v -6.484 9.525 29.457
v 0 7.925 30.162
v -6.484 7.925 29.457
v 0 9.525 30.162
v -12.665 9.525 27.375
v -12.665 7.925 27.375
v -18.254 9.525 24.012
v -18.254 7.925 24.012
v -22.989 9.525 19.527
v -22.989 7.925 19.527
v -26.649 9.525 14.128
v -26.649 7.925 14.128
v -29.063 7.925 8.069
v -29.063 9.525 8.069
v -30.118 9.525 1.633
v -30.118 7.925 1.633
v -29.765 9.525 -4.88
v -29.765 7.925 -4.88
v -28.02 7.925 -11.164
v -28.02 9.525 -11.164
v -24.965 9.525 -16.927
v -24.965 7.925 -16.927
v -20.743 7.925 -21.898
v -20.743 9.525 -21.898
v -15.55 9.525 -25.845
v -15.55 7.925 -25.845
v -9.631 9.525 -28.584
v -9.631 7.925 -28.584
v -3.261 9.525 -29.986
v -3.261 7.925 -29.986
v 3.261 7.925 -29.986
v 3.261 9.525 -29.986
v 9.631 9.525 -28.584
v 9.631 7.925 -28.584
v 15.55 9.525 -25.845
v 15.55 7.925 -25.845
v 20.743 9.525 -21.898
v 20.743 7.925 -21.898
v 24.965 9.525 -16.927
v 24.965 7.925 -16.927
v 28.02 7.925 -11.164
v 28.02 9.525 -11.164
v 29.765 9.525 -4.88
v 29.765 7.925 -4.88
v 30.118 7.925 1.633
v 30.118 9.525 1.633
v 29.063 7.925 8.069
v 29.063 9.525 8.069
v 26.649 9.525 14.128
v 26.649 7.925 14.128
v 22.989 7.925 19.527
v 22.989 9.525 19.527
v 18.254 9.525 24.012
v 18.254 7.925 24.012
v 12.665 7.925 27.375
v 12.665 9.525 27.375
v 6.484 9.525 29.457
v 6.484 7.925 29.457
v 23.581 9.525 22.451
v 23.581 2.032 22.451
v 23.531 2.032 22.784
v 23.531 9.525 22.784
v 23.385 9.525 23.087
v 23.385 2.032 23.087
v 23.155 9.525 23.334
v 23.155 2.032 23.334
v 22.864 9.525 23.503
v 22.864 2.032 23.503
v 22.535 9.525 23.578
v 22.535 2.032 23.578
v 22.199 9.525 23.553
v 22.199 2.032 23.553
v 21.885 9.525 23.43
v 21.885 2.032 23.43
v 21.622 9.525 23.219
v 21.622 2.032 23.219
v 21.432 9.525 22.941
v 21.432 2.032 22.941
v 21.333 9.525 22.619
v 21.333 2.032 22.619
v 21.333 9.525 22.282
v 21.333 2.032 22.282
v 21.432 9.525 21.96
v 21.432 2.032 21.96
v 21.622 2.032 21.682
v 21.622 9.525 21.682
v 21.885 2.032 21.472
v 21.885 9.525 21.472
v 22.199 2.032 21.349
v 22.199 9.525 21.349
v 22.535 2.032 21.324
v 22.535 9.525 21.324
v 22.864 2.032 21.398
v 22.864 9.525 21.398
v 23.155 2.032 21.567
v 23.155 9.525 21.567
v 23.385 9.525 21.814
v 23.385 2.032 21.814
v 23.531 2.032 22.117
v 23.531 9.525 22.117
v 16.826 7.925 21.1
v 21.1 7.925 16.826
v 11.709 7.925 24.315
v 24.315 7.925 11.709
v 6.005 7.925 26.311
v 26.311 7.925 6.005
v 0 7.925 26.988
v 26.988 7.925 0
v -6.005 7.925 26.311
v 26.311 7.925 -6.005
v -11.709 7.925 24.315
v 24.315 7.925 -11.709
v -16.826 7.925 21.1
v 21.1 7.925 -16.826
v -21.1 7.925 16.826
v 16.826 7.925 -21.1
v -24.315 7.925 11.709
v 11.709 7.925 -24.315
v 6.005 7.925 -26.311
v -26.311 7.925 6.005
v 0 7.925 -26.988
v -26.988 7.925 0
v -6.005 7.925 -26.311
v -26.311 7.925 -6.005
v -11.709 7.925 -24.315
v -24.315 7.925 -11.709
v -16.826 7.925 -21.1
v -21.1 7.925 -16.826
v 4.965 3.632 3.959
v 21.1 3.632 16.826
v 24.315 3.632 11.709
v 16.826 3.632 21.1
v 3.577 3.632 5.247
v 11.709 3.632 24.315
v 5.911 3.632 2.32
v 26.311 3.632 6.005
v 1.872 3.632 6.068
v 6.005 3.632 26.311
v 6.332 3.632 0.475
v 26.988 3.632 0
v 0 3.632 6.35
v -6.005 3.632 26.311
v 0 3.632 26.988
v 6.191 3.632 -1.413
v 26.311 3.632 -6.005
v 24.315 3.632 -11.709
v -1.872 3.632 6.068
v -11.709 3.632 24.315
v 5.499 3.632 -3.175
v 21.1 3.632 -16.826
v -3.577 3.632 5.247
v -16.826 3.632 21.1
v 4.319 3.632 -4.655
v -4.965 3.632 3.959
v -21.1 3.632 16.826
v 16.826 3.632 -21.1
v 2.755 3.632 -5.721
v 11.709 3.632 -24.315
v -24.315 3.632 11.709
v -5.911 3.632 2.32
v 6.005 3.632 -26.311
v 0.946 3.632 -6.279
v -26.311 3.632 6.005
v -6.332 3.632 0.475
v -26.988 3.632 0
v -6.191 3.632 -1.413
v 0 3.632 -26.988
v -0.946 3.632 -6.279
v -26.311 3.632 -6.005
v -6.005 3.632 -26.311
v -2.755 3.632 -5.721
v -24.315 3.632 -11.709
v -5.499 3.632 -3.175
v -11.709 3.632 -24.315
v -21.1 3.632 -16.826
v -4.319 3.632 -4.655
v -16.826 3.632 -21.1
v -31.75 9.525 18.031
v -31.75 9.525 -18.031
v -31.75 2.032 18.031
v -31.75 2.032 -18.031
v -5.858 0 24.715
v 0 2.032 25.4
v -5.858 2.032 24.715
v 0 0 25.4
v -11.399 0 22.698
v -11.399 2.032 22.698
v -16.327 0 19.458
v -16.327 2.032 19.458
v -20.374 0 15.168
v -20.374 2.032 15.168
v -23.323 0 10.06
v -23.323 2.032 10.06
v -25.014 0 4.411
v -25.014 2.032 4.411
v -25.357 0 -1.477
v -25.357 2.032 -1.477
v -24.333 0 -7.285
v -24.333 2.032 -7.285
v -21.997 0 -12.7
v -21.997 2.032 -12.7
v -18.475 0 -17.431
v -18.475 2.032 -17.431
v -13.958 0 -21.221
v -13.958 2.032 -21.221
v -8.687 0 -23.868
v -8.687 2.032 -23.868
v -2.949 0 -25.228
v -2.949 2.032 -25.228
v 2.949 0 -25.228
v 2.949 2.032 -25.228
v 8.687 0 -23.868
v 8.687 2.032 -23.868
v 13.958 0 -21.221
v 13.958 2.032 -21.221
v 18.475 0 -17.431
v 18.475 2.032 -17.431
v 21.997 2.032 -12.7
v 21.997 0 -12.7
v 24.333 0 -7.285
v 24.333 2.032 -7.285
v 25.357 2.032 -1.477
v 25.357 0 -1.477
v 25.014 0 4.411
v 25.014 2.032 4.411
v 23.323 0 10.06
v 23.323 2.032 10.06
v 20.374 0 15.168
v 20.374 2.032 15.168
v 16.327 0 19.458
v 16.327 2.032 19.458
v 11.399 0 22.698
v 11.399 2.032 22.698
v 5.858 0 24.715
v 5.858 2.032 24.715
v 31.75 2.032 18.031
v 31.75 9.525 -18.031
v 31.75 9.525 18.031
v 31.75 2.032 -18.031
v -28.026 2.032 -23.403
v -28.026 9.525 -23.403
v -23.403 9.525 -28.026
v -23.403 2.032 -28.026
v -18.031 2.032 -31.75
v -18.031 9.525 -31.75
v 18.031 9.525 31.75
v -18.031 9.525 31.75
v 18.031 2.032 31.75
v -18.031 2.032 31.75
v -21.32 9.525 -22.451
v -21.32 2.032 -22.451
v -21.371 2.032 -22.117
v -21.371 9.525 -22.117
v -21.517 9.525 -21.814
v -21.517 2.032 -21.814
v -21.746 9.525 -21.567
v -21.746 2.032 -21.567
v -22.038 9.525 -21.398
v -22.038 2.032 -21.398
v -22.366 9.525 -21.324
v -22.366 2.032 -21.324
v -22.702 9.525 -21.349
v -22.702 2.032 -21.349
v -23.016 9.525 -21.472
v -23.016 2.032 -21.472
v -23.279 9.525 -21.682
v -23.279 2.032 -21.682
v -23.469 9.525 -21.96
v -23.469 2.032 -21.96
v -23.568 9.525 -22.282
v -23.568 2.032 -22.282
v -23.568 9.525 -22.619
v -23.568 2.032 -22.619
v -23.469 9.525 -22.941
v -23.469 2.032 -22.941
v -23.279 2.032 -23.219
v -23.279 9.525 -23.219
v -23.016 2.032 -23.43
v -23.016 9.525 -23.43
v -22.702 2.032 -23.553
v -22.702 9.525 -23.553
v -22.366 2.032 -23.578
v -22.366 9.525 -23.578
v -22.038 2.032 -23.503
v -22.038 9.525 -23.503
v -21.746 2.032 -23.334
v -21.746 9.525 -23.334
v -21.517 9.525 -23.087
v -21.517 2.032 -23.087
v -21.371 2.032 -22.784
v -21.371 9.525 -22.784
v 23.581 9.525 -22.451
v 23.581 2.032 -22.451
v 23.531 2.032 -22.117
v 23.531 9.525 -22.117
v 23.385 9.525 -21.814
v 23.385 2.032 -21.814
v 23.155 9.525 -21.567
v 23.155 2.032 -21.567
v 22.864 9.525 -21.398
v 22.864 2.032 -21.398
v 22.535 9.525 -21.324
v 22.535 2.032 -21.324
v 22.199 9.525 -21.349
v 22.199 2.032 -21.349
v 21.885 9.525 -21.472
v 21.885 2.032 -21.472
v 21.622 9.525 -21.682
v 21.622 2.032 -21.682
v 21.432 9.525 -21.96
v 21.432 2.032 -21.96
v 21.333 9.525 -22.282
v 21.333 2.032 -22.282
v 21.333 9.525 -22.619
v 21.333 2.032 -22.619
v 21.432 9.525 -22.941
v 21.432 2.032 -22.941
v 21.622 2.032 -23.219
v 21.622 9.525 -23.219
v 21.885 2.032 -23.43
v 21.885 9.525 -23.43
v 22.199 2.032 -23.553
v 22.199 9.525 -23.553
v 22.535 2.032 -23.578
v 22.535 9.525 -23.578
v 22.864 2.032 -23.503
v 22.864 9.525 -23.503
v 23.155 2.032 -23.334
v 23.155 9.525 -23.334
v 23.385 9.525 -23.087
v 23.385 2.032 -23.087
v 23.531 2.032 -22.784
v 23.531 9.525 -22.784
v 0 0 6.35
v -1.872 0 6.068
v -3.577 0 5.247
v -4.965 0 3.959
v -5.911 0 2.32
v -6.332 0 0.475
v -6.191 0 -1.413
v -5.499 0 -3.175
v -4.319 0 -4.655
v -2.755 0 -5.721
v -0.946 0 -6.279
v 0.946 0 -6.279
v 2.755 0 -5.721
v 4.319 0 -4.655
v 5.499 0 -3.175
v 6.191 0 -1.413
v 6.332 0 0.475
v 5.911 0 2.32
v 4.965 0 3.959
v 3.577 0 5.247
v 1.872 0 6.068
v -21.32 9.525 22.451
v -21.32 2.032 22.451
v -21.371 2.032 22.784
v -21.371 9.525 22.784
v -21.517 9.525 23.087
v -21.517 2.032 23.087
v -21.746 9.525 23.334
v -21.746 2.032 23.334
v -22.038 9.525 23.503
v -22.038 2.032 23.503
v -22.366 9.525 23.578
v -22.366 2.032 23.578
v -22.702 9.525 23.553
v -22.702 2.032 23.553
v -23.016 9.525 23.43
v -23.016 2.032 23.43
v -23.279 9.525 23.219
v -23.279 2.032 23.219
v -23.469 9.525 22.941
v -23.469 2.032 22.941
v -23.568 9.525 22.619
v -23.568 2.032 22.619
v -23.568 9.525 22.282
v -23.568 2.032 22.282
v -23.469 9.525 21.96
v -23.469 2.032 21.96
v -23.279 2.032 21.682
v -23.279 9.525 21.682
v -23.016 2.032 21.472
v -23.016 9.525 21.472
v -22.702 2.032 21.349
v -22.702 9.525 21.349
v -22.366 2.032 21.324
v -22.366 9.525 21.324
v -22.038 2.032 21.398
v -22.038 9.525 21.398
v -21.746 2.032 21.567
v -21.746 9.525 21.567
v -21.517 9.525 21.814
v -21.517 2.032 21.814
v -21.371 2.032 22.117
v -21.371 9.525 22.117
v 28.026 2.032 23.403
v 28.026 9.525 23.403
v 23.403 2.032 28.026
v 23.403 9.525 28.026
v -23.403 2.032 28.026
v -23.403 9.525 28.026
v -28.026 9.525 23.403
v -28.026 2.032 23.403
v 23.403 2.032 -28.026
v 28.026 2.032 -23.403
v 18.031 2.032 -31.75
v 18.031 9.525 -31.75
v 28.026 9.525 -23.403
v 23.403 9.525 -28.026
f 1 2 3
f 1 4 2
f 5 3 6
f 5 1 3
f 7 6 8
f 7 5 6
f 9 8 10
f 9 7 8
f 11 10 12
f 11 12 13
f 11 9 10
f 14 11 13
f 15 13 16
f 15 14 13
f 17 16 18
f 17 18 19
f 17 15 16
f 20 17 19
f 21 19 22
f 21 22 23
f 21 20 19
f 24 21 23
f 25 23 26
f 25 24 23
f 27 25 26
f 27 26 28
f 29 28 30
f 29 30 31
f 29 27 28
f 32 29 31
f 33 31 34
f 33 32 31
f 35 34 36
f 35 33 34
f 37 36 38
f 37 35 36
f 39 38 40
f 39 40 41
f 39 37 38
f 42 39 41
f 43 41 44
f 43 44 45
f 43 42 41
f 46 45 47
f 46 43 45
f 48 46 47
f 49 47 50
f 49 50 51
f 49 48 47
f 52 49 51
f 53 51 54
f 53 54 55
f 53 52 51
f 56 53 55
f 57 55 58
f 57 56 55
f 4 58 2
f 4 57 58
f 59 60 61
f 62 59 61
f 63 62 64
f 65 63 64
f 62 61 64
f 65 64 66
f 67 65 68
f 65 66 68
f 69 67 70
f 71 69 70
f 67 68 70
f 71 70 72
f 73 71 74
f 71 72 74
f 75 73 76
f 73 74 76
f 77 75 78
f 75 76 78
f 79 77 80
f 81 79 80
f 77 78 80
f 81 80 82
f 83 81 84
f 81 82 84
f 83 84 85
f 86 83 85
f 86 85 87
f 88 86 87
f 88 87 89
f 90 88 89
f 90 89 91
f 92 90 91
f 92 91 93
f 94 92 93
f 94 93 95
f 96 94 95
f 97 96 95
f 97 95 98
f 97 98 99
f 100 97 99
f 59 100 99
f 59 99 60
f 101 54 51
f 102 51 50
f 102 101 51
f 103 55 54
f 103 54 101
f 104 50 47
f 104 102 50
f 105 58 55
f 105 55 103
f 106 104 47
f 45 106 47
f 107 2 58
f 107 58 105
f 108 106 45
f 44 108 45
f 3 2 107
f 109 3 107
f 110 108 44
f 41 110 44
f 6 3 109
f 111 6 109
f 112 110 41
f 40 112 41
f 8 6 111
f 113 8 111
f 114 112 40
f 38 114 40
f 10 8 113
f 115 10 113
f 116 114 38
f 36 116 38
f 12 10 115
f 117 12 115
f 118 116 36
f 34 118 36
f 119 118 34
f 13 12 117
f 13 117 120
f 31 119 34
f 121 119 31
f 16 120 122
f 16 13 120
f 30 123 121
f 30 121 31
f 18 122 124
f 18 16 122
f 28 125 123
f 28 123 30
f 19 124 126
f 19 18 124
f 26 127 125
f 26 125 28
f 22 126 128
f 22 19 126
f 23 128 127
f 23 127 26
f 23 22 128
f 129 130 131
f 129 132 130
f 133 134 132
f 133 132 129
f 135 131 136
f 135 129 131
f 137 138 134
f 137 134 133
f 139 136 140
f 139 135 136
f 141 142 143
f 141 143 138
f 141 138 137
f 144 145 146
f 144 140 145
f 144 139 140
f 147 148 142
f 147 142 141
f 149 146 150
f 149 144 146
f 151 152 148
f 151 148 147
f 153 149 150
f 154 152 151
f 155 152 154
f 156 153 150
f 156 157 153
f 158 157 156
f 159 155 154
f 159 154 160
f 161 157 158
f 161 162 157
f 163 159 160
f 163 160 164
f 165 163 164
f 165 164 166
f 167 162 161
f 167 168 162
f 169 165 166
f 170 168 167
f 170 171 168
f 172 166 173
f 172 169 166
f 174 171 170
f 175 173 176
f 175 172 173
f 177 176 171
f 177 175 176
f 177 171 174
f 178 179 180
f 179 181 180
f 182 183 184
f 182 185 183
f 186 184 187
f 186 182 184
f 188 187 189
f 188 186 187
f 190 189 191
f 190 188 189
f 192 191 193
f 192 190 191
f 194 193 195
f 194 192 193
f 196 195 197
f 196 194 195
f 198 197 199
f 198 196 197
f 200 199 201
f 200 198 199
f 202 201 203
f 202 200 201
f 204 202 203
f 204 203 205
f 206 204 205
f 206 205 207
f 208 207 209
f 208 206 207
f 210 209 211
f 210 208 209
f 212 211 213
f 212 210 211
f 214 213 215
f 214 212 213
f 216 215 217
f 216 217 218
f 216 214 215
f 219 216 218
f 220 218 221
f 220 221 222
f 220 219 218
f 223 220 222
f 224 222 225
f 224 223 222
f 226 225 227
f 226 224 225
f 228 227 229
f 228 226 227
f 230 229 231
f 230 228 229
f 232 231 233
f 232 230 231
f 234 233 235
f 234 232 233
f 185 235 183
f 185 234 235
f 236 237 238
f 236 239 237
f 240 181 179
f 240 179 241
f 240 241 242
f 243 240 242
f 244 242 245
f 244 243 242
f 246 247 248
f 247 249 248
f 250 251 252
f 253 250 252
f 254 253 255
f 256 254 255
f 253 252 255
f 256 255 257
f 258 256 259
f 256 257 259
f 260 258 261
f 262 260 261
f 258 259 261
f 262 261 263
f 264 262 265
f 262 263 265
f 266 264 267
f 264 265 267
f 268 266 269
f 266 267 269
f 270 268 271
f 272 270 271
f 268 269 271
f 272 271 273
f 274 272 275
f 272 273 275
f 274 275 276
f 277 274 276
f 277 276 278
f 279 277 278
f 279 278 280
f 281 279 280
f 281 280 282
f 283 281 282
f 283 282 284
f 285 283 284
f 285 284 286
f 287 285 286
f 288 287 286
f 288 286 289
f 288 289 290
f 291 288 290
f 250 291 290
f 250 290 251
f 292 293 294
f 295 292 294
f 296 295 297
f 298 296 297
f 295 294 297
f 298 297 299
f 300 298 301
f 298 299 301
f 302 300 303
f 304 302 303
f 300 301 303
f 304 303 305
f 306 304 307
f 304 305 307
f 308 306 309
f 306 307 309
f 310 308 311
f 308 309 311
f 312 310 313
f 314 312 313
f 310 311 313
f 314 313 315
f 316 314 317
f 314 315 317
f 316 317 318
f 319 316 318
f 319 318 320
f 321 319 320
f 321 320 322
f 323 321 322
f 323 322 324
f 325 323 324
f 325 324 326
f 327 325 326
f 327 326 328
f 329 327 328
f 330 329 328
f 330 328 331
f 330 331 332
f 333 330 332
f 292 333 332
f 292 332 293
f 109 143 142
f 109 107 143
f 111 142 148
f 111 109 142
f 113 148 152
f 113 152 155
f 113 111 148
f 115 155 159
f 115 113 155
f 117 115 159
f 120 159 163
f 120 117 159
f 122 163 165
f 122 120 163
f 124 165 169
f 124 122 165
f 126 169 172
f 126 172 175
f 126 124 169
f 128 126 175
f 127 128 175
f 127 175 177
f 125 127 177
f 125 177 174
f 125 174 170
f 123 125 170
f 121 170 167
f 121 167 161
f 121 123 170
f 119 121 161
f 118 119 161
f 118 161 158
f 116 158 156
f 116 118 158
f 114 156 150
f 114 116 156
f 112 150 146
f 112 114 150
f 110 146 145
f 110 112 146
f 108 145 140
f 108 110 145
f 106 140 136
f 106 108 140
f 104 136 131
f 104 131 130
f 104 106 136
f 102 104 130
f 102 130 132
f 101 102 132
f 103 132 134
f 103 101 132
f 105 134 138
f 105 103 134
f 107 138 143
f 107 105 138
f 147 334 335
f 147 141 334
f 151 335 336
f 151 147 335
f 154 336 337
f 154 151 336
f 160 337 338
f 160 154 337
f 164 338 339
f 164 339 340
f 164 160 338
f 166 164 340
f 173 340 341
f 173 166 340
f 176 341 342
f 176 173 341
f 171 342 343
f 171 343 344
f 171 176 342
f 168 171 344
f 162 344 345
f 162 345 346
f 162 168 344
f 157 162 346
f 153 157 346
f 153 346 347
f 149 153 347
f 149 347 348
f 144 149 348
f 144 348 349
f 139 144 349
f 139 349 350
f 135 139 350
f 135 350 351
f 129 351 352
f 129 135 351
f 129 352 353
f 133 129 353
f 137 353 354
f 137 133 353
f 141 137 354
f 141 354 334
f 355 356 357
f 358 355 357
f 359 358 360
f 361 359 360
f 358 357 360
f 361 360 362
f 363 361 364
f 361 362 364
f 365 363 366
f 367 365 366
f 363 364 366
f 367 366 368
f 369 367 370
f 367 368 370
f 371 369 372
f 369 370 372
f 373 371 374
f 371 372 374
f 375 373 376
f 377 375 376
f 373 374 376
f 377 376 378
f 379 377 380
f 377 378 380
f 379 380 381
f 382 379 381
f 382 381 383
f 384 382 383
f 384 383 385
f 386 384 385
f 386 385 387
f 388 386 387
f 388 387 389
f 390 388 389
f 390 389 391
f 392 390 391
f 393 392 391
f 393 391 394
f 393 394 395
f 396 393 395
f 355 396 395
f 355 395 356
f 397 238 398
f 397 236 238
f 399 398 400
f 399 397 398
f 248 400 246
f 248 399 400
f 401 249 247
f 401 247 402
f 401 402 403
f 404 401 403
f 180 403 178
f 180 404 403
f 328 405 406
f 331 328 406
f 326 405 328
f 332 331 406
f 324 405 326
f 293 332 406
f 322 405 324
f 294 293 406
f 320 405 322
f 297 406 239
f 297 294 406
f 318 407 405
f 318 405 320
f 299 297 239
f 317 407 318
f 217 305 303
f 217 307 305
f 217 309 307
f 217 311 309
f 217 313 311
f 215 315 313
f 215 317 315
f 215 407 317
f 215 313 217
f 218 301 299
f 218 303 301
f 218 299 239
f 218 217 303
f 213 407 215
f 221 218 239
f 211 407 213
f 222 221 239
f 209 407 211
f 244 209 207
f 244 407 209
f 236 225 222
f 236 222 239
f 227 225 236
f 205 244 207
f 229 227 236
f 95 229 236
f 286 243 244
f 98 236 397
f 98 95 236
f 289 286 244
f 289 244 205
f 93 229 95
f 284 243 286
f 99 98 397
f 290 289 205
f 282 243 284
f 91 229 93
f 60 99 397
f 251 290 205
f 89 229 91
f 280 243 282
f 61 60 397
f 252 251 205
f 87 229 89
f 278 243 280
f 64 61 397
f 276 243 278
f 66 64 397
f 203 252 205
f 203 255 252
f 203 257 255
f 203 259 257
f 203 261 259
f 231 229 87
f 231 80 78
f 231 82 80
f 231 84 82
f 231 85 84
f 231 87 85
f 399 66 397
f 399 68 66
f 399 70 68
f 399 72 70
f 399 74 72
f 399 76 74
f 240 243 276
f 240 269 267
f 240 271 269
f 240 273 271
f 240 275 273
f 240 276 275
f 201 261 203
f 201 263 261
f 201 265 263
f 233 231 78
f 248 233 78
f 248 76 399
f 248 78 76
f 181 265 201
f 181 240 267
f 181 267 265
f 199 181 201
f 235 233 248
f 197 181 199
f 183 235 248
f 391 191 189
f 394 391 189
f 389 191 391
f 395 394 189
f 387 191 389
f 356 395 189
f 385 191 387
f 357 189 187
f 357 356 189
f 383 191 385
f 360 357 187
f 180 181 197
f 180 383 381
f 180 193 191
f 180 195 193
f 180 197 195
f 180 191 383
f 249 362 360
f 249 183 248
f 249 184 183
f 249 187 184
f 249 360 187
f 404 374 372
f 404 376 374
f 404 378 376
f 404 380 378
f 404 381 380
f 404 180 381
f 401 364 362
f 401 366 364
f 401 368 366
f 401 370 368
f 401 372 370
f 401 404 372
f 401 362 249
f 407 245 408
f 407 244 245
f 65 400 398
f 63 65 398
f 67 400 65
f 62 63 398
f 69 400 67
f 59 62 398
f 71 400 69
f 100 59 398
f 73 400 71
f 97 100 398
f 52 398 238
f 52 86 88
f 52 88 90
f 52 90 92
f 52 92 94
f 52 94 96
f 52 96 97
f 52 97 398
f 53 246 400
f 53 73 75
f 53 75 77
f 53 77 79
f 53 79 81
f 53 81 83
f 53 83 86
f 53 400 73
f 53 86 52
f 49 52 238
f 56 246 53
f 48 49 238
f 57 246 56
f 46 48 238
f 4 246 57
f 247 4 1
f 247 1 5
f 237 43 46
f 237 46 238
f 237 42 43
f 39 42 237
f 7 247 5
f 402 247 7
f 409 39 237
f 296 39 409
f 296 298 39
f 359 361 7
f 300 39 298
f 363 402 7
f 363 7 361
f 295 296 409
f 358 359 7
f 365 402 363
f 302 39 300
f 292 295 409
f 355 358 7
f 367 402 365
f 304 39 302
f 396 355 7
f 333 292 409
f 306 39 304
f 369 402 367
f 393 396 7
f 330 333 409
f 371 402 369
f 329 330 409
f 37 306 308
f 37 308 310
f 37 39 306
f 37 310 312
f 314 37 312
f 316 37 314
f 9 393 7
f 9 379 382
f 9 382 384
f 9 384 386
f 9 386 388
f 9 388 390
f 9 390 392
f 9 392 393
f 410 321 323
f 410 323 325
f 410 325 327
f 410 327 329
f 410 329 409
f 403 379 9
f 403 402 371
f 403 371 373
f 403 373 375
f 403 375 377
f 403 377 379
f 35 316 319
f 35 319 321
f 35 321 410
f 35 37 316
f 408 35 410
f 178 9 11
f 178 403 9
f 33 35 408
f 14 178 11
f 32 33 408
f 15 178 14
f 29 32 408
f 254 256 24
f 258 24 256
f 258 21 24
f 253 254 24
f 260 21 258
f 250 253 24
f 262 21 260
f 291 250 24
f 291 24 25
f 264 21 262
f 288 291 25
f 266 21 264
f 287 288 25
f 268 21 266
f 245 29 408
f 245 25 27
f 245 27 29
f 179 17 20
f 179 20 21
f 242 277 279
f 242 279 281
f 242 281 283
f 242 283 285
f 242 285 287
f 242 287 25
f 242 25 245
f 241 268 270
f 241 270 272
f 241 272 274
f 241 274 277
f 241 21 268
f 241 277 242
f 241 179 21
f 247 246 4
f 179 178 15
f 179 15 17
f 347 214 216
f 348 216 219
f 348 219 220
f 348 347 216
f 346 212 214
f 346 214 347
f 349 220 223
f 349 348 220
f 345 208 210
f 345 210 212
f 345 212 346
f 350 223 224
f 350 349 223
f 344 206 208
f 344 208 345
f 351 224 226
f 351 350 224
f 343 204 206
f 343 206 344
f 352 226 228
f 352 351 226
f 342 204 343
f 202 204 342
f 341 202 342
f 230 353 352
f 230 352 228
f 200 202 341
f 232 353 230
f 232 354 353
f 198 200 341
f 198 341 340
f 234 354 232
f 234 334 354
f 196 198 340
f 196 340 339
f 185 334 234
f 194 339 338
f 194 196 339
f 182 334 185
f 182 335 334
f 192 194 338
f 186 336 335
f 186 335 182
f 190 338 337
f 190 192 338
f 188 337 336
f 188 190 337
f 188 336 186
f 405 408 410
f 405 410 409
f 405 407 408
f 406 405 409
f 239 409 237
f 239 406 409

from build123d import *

# Parameters (mm, degrees)
F2_W     = 63.5
F2_H     = 63.5
F3_DEPTH = 9.526
F5_D     = 2.2606


with BuildPart() as f1:
    # F0 (on Right) → F1 (revolve)
    with BuildSketch(Plane.YZ):
        Polygon((0, 25.4), (0, 6.35), (3.6322, 6.35), (3.6322, 26.9875), (7.9248, 26.9875), (7.9248, 30.1625), (9.525, 30.1625), (9.525, 36.5125), (2.032, 36.5125), (2.032, 25.4), align=None)
    revolve(axis=Axis((0, 1.8161, 0), (0, -1, 0)))

    # F2 (on Front) → F3 (intersect, through all)
    with BuildSketch(Plane.XZ):
        Rectangle(F2_W, F2_H)
    extrude(amount=-F3_DEPTH, mode=Mode.INTERSECT)

    # F5 (through all)
    with Locations(Plane(origin=(0, 9.525, 0), x_dir=(-1, 0, 0), z_dir=(0, 1, 0))):
        with Locations((-22.4506403027, 22.4506403027), (22.4506403027, 22.4506403027), (22.4506403027, -22.4506403027), (-22.4506403027, -22.4506403027)):
            Hole(F5_D / 2)


solid = f1.part
